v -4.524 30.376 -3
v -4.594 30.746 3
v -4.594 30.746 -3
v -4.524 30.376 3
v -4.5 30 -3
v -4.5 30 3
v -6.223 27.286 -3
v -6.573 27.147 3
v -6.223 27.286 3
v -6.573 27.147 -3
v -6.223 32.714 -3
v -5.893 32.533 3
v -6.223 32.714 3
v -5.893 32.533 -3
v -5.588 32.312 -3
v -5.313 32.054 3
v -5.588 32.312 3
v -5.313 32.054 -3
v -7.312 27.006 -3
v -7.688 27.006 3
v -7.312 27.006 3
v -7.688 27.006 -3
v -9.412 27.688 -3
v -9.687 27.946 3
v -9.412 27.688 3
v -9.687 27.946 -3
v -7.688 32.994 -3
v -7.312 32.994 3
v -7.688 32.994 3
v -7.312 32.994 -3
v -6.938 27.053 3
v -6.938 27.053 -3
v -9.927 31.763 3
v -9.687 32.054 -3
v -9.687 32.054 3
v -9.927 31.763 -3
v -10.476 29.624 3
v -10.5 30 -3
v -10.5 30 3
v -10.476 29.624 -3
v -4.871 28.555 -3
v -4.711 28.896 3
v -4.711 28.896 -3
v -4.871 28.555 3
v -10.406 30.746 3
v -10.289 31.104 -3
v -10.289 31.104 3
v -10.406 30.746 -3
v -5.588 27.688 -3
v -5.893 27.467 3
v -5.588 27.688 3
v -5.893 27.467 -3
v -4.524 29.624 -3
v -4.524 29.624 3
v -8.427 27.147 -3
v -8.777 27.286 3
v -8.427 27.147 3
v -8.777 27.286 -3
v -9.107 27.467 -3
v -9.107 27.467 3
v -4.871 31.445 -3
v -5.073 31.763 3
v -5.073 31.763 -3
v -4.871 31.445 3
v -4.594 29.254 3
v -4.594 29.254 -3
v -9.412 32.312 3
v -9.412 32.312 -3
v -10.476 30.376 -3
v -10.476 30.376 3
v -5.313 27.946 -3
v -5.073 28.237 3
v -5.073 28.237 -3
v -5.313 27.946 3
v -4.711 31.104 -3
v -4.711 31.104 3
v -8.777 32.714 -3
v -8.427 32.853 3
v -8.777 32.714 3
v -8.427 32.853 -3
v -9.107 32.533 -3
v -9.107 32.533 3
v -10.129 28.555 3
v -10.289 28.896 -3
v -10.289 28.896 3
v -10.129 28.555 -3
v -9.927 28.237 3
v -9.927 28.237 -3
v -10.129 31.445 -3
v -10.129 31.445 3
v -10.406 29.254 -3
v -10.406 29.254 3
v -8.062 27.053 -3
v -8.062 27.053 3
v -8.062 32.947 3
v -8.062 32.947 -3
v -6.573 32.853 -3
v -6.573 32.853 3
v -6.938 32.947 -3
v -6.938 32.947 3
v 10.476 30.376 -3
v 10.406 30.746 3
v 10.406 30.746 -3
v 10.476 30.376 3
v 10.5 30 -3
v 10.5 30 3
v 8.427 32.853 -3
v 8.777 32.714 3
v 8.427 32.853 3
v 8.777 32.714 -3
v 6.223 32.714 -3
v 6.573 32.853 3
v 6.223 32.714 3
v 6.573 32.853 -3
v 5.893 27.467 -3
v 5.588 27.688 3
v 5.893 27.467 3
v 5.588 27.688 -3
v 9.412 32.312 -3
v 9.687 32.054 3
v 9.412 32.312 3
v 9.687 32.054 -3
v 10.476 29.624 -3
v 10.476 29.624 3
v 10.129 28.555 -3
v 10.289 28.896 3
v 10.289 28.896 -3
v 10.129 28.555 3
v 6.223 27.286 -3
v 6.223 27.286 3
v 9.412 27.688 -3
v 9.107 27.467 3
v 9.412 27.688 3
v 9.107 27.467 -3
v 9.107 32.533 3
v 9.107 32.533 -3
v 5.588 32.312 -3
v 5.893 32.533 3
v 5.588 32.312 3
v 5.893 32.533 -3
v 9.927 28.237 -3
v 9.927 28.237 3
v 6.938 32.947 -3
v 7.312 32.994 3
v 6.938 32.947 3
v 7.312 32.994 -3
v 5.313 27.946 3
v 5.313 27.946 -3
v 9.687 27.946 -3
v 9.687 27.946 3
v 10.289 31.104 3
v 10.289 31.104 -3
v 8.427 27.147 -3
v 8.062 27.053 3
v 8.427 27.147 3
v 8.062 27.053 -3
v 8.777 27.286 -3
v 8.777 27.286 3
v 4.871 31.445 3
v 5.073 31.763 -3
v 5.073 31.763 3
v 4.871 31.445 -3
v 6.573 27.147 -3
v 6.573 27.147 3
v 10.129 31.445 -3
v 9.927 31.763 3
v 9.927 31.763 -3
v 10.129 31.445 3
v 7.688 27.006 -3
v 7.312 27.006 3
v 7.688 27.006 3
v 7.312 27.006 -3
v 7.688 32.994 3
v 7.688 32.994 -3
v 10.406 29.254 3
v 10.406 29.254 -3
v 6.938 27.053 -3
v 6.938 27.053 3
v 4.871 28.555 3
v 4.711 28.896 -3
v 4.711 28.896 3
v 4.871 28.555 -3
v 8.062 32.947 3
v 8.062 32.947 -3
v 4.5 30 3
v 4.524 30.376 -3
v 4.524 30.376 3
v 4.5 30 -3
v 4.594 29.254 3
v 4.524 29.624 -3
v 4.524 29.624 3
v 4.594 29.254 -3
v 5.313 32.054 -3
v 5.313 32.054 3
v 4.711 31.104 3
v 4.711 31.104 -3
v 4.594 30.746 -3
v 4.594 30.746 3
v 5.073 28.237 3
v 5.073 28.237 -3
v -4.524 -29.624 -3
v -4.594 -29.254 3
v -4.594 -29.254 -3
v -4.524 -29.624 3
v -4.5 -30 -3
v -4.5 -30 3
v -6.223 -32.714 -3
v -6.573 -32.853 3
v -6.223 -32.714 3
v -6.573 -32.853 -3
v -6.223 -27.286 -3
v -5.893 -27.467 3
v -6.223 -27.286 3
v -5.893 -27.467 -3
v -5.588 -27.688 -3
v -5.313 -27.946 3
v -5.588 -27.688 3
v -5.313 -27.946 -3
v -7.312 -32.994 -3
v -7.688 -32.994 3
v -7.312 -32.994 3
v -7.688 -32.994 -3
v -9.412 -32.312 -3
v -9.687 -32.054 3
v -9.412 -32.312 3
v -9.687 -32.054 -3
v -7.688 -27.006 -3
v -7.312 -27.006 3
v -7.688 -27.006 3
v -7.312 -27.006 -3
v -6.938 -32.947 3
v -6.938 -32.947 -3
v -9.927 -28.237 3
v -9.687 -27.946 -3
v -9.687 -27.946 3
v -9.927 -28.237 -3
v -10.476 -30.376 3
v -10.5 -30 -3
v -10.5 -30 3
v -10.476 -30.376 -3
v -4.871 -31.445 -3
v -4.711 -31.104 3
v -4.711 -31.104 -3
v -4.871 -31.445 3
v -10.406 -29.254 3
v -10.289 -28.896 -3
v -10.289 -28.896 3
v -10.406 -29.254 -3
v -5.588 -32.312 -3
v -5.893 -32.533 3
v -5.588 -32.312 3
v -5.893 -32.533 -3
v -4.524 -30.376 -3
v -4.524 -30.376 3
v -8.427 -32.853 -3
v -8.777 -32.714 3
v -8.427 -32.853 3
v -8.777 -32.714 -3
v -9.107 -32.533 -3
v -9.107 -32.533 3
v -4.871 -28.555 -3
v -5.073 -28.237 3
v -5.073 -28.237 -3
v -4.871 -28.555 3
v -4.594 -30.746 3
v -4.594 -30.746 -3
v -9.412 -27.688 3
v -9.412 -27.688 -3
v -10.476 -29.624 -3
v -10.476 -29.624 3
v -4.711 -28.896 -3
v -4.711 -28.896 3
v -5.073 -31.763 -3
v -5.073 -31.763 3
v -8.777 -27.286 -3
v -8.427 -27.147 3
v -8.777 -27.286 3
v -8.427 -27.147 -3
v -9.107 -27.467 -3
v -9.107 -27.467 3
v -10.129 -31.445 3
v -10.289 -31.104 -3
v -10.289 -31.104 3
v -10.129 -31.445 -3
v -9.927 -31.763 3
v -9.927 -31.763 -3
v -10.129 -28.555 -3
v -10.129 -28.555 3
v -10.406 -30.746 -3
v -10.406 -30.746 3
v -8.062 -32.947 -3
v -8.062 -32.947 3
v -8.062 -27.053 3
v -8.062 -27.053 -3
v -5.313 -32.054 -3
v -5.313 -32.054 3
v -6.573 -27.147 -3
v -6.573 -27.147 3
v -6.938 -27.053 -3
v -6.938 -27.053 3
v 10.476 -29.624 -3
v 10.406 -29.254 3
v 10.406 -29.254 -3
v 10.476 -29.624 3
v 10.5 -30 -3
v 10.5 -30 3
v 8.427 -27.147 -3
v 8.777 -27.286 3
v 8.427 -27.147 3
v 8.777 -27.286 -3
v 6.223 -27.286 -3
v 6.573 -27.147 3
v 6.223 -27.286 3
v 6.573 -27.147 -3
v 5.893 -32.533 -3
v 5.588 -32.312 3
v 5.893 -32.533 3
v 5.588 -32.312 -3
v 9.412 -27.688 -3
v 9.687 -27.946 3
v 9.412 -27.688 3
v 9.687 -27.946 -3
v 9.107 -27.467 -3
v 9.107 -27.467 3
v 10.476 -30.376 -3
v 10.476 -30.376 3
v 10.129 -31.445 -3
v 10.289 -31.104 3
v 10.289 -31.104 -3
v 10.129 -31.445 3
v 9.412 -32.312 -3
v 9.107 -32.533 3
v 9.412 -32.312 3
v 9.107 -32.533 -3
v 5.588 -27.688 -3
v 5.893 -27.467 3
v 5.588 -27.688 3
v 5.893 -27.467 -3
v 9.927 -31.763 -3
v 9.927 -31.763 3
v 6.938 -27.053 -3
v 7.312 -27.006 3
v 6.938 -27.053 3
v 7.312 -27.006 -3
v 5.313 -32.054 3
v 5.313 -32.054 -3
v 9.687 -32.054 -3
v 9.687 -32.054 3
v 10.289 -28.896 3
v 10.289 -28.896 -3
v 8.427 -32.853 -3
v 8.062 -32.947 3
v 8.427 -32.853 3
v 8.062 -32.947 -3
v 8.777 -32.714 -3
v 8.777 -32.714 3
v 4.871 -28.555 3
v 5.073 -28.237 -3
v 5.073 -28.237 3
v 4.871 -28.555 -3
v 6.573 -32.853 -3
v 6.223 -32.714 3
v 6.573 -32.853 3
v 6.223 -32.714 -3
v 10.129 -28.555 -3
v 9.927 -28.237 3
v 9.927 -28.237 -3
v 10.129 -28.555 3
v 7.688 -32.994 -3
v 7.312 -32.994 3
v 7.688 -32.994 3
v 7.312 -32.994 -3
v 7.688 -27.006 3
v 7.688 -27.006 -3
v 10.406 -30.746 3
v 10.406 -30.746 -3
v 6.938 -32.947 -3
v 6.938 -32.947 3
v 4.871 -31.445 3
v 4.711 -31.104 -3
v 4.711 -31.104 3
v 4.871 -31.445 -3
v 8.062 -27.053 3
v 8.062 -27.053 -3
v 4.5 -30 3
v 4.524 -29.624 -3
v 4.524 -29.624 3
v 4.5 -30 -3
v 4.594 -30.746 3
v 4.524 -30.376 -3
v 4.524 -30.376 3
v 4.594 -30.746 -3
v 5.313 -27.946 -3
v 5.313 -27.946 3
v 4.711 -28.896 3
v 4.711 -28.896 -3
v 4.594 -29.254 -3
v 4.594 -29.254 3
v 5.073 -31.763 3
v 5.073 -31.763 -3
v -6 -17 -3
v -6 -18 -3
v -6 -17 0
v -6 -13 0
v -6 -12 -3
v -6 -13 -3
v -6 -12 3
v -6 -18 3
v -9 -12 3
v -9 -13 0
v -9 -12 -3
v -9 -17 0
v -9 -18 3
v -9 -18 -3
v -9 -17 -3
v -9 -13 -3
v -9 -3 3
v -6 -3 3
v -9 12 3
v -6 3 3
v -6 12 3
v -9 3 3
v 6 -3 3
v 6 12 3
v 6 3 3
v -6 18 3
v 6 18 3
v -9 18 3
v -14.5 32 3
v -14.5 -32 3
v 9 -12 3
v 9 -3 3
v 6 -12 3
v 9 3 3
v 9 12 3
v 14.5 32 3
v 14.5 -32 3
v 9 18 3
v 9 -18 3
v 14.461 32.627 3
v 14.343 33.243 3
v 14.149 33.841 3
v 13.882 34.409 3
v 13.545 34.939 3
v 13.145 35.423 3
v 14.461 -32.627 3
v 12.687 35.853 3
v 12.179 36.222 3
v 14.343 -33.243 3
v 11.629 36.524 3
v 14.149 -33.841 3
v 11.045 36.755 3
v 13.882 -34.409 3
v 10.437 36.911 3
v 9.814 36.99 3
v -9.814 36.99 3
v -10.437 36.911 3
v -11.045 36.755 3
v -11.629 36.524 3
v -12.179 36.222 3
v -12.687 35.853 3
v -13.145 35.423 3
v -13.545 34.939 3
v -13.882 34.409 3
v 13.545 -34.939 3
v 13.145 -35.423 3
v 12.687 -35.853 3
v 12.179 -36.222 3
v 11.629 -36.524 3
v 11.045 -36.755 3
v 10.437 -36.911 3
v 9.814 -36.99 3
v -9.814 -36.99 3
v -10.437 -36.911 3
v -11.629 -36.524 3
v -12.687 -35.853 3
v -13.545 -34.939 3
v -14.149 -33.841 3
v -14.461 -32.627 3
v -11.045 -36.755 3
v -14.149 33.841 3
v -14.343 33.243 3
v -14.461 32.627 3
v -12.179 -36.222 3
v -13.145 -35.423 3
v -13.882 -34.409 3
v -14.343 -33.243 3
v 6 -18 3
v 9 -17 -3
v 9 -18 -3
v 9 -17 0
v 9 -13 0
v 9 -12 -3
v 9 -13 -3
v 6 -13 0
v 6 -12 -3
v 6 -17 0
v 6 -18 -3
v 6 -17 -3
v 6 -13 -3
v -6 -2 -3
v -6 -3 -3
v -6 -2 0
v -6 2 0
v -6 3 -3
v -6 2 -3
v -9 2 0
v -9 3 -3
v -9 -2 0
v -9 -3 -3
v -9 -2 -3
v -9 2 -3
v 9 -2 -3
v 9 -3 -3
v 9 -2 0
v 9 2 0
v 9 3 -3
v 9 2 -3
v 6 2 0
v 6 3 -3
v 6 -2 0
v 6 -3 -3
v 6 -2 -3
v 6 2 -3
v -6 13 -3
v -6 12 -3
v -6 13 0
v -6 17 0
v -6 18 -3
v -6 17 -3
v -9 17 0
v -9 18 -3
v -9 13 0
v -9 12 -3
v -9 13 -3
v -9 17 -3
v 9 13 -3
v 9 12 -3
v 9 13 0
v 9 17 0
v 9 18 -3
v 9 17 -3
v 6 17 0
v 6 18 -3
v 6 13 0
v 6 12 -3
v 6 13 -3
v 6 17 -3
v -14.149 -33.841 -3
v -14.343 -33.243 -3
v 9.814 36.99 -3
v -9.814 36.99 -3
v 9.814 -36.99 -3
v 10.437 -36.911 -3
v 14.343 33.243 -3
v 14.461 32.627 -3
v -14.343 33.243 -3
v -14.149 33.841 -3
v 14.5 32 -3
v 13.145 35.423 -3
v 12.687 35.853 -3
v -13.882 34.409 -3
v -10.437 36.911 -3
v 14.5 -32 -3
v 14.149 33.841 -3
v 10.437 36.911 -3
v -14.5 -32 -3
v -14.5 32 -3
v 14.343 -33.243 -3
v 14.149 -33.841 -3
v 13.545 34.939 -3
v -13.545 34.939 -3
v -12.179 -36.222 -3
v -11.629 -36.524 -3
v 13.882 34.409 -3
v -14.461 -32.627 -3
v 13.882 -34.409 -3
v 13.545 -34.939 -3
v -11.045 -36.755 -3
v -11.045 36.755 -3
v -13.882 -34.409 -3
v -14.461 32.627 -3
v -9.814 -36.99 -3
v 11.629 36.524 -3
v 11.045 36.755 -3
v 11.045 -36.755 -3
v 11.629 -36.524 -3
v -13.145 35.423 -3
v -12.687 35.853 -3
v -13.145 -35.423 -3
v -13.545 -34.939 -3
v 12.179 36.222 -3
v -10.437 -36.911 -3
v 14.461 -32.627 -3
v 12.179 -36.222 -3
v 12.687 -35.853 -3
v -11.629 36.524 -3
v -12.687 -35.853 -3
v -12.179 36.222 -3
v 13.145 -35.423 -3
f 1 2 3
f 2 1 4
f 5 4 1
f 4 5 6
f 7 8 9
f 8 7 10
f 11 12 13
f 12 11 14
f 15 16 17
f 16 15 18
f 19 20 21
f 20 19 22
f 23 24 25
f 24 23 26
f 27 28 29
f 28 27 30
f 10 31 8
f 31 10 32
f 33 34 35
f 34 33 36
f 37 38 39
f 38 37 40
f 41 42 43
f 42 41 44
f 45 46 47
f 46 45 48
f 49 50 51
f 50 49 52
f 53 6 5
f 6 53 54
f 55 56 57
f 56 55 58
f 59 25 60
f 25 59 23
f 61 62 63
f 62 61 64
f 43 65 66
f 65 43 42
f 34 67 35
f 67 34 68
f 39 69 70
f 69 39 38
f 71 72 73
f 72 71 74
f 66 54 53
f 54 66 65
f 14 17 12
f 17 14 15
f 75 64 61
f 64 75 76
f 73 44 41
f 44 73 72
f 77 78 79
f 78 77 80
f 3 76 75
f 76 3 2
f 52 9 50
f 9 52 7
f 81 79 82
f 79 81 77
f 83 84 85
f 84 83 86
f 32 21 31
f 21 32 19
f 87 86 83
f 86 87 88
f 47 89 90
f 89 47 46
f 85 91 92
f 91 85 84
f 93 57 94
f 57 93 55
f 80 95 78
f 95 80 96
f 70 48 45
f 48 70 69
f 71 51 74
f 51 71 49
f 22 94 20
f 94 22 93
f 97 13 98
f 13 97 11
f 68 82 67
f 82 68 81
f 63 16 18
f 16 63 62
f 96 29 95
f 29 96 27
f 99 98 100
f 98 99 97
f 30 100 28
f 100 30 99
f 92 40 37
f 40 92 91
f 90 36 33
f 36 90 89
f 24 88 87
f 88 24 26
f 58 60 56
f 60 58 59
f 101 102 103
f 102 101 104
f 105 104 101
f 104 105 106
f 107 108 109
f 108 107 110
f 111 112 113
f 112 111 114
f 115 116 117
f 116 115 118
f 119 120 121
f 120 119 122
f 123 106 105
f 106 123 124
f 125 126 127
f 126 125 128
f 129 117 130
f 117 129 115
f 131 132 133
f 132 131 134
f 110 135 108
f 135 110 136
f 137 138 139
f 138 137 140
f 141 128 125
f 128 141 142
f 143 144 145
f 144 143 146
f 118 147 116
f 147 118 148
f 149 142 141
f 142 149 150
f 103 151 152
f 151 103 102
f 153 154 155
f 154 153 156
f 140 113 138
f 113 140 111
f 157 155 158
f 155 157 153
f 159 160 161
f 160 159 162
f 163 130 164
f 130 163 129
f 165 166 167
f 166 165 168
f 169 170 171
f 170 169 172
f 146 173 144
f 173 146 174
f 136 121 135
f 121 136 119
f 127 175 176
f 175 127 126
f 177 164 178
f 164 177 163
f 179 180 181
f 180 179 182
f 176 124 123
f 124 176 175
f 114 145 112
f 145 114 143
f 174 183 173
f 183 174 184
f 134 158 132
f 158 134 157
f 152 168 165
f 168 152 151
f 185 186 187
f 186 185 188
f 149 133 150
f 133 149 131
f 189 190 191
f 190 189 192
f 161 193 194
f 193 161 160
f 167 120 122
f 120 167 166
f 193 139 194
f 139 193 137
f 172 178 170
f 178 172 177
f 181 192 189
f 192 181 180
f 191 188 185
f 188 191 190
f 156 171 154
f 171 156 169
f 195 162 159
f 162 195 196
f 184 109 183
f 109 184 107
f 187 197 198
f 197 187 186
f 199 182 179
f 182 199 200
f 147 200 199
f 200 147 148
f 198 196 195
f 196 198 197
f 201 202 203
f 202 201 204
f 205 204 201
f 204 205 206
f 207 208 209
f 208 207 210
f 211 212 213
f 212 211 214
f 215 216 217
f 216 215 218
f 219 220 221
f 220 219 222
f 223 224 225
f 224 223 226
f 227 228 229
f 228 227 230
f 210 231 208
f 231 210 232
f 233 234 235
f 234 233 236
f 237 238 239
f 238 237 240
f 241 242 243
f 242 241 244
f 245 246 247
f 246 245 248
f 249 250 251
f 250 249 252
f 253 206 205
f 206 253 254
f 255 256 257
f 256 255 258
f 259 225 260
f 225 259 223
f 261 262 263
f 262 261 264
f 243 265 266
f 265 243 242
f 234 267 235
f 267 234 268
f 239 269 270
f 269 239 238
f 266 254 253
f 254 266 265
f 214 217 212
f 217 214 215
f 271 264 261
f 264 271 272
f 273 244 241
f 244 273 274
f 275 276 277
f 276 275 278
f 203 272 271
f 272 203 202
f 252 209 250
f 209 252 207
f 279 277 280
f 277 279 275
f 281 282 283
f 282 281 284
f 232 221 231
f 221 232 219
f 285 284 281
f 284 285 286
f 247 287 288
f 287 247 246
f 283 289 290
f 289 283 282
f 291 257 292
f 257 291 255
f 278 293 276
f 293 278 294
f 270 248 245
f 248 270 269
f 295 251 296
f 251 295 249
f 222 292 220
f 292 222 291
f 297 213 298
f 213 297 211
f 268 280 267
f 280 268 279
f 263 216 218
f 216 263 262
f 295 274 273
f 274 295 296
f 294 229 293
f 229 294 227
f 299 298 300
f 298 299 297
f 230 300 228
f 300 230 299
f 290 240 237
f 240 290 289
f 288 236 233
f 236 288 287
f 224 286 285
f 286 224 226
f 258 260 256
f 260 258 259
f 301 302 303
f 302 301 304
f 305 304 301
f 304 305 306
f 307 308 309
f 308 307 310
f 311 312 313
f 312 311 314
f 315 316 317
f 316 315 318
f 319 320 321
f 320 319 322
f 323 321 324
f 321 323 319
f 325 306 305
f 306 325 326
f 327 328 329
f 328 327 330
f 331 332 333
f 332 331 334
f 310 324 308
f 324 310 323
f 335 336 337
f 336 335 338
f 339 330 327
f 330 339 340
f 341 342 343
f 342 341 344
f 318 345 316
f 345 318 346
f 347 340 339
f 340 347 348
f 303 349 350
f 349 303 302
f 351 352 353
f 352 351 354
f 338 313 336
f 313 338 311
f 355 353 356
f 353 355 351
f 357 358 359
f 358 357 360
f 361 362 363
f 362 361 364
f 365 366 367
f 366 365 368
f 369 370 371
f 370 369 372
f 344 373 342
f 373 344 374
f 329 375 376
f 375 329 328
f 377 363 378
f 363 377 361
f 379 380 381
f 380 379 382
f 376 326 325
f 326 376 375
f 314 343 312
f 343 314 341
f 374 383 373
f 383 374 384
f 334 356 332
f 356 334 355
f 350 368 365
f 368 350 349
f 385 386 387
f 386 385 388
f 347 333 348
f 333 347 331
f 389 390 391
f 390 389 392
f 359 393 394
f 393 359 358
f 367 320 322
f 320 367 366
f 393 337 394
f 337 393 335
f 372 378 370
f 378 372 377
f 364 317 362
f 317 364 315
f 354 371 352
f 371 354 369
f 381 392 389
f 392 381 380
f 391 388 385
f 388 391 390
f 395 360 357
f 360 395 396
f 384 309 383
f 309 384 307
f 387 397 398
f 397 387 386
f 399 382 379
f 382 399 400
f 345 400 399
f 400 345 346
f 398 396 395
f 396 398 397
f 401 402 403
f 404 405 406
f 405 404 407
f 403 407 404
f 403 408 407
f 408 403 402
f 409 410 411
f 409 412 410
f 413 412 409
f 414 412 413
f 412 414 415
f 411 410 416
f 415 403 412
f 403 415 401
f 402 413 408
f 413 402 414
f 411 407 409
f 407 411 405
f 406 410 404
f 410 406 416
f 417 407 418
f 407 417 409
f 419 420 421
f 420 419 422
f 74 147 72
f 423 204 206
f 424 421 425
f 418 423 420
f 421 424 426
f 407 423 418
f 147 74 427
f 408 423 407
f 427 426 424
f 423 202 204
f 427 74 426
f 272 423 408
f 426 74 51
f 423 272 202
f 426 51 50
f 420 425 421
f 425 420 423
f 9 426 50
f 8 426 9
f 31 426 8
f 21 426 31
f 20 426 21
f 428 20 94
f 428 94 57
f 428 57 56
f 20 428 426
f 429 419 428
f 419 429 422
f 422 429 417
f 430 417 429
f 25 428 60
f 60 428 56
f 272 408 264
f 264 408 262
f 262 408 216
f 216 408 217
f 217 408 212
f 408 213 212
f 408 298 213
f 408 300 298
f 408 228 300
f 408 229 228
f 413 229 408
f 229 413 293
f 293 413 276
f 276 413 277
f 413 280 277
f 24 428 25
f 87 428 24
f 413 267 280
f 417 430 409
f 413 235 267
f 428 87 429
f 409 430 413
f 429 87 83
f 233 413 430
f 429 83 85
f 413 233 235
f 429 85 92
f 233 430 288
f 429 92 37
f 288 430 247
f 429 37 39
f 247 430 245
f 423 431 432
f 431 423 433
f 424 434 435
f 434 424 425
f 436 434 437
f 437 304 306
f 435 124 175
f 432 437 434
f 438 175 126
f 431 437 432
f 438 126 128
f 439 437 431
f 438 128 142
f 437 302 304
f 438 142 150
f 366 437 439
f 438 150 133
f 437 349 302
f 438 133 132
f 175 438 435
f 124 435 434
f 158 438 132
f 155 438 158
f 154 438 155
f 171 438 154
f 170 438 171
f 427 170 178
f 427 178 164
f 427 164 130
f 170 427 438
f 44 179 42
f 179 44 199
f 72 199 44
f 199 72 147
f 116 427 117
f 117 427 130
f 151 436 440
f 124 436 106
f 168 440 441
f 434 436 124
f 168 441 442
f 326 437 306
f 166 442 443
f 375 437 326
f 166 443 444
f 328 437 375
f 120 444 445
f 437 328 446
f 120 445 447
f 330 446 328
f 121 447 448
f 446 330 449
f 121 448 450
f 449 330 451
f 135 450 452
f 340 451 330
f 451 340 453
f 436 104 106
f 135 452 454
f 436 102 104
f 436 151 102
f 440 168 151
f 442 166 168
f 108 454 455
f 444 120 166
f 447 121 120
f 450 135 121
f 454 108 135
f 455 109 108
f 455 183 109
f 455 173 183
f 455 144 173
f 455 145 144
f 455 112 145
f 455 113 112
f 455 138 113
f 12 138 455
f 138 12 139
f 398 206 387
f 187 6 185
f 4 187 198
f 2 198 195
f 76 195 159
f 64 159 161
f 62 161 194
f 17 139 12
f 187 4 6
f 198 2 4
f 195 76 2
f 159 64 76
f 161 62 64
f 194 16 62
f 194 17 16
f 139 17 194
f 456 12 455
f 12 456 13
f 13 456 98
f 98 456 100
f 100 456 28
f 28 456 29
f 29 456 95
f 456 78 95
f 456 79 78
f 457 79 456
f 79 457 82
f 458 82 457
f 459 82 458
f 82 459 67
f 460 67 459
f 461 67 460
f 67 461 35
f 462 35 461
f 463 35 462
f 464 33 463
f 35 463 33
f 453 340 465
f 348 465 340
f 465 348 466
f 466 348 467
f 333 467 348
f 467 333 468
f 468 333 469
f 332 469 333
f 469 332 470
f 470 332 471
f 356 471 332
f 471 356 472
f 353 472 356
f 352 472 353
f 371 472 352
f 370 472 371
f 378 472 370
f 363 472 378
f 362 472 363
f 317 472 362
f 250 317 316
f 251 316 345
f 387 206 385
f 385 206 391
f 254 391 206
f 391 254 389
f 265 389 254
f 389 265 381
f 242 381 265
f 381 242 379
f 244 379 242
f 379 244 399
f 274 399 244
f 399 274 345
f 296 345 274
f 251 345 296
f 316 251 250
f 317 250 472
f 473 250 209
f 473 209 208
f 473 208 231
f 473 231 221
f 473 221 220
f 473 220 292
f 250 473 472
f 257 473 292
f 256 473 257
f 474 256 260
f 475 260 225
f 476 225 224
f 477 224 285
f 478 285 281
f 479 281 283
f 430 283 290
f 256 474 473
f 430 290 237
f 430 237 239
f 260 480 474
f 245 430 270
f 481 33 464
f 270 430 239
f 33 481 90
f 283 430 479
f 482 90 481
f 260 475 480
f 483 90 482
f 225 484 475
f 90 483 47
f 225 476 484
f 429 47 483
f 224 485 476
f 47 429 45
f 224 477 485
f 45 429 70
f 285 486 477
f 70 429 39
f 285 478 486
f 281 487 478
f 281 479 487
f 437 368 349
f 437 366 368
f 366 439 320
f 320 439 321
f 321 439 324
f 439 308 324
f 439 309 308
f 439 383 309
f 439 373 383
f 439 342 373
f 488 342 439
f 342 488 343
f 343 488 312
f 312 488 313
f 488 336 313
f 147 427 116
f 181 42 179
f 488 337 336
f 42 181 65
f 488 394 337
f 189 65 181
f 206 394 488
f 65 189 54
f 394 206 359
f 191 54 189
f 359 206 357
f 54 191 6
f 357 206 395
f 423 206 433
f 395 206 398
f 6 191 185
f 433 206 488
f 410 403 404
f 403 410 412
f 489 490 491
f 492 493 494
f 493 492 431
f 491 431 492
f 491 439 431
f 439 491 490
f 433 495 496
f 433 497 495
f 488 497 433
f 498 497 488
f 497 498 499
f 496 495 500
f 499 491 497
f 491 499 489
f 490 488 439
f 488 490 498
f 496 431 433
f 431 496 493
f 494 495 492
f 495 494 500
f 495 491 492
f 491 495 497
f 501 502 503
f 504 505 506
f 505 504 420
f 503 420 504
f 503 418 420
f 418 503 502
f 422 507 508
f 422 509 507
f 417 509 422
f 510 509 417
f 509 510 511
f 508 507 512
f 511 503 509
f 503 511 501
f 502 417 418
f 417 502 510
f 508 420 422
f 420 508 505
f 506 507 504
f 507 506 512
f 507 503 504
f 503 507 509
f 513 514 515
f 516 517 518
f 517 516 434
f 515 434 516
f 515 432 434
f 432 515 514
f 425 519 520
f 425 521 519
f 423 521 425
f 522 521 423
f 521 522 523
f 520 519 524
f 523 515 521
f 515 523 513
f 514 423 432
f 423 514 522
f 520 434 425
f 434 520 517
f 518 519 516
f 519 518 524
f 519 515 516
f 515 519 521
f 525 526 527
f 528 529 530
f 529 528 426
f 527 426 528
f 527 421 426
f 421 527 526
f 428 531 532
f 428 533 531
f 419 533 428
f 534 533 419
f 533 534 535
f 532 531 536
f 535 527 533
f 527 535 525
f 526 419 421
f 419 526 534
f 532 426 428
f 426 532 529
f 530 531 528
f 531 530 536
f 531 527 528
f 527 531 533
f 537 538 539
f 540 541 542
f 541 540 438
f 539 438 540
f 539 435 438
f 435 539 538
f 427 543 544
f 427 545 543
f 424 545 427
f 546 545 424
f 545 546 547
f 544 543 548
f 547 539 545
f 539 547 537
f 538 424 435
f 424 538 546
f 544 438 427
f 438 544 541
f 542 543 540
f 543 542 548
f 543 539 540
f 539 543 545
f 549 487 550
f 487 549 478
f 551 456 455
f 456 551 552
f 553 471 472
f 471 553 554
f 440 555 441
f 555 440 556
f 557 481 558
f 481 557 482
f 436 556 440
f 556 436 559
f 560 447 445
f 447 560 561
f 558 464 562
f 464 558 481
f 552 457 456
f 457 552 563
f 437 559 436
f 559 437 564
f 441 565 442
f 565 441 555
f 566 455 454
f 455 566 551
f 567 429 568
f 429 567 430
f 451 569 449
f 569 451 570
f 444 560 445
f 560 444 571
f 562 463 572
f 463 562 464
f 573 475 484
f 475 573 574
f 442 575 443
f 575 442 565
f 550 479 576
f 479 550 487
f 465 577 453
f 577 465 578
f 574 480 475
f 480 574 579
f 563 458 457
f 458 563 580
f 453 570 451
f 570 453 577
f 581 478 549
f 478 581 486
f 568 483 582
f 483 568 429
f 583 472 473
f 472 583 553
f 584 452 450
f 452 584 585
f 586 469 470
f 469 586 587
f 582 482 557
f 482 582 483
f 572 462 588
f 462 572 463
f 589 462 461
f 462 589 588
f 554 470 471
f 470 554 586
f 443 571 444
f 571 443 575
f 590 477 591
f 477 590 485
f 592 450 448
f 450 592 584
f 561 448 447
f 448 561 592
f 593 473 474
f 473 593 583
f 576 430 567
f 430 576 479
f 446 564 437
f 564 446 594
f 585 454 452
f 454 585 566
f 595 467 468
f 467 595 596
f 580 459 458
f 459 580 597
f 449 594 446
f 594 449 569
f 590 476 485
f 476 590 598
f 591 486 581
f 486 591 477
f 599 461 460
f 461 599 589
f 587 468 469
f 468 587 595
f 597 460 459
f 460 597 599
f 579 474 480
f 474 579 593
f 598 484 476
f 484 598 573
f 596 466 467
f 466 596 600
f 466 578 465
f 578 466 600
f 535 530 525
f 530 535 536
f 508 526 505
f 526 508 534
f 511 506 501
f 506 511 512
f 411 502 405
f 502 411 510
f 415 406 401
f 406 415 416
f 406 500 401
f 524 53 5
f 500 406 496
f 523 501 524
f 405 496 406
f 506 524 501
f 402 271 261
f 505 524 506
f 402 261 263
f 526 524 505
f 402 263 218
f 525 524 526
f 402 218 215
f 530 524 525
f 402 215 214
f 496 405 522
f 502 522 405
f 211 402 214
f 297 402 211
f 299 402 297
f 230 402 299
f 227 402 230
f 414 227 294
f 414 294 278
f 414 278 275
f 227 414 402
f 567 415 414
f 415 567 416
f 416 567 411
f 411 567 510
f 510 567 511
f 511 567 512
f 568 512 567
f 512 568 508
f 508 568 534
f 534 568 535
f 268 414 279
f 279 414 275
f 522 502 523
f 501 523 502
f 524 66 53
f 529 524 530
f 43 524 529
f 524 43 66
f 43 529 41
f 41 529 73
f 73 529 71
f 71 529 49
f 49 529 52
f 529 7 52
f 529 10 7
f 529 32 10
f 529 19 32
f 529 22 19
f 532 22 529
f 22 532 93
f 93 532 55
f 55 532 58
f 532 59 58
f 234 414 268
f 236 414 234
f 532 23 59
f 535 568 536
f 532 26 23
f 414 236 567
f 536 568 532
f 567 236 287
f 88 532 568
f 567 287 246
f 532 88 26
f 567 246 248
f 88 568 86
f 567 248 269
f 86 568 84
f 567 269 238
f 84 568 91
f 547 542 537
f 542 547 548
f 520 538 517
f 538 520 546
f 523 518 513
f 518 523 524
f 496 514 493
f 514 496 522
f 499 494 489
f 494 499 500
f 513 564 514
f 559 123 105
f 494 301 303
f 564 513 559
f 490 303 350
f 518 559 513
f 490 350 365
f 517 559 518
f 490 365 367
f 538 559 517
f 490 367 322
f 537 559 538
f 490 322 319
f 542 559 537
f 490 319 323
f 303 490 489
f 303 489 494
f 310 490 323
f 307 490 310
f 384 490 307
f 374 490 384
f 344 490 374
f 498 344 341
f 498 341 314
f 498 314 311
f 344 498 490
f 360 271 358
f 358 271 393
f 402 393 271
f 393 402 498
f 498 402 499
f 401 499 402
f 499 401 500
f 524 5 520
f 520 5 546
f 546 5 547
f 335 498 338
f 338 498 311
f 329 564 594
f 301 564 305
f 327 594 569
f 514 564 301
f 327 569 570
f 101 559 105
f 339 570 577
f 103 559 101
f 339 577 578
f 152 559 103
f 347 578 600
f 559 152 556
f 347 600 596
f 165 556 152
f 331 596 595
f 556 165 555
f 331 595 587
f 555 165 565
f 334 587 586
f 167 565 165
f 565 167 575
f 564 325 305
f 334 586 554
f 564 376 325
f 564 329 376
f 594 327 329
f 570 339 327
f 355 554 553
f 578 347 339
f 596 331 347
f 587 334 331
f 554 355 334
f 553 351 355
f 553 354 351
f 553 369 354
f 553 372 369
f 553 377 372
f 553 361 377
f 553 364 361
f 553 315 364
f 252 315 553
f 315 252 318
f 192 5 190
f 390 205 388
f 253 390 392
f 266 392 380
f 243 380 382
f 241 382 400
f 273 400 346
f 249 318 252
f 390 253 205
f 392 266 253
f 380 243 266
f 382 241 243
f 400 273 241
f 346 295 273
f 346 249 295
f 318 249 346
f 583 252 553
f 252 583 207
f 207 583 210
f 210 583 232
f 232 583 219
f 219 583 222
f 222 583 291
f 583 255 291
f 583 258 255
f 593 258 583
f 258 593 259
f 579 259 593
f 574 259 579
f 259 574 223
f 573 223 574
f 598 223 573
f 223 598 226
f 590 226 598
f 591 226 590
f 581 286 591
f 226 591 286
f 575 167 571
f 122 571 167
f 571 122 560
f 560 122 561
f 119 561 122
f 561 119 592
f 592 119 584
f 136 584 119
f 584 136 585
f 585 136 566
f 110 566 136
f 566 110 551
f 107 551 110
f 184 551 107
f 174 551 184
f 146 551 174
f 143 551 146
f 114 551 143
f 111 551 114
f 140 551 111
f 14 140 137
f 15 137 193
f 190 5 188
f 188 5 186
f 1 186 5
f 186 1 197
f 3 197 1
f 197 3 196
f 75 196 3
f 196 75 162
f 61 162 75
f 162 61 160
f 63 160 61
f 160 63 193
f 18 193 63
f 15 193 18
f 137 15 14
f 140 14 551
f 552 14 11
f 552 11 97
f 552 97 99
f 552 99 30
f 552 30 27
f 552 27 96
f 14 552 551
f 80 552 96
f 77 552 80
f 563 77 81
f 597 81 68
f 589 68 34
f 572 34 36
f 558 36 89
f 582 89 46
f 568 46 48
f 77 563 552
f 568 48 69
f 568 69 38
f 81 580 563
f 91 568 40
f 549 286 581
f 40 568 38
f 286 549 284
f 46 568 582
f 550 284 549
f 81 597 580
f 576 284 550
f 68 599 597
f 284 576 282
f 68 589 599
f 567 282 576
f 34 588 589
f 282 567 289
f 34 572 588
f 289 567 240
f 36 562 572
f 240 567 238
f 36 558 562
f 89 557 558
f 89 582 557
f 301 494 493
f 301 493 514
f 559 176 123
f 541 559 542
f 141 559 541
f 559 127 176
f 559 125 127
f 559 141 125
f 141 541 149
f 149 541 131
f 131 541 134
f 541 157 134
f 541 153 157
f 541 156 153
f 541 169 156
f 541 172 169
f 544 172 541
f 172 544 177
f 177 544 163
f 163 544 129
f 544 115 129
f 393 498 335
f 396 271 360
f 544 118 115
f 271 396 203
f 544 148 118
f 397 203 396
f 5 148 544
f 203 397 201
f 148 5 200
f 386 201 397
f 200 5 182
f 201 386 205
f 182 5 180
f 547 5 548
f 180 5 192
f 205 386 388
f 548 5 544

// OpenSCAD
$fn = 50;


difference() {
	union() {
		translate(v = [0, 0, -3.0000000000]) {
			rotate(a = [0, 0, 0]) {
				hull() {
					translate(v = [-9.5000000000, 32.0000000000, 0]) {
						rotate(a = [0, 0, 0]) {
							translate(v = [0, 0, 0]) {
								rotate(a = [0, 0, 0]) {
									cylinder(h = 6, r = 5);
								}
							}
						}
					}
					translate(v = [9.5000000000, 32.0000000000, 0]) {
						rotate(a = [0, 0, 0]) {
							translate(v = [0, 0, 0]) {
								rotate(a = [0, 0, 0]) {
									cylinder(h = 6, r = 5);
								}
							}
						}
					}
					translate(v = [-9.5000000000, -32.0000000000, 0]) {
						rotate(a = [0, 0, 0]) {
							translate(v = [0, 0, 0]) {
								rotate(a = [0, 0, 0]) {
									cylinder(h = 6, r = 5);
								}
							}
						}
					}
					translate(v = [9.5000000000, -32.0000000000, 0]) {
						rotate(a = [0, 0, 0]) {
							translate(v = [0, 0, 0]) {
								rotate(a = [0, 0, 0]) {
									cylinder(h = 6, r = 5);
								}
							}
						}
					}
				}
			}
		}
	}
	union() {
		translate(v = [-7.5000000000, 30.0000000000, -125.0000000000]) {
			rotate(a = [0, 0, 0]) {
				cylinder(h = 250, r = 3.0000000000);
			}
		}
		translate(v = [7.5000000000, 30.0000000000, -125.0000000000]) {
			rotate(a = [0, 0, 0]) {
				cylinder(h = 250, r = 3.0000000000);
			}
		}
		translate(v = [-7.5000000000, -30.0000000000, -125.0000000000]) {
			rotate(a = [0, 0, 0]) {
				cylinder(h = 250, r = 3.0000000000);
			}
		}
		translate(v = [7.5000000000, -30.0000000000, -125.0000000000]) {
			rotate(a = [0, 0, 0]) {
				cylinder(h = 250, r = 3.0000000000);
			}
		}
		translate(v = [-9.0000000000, -18.0000000000, -50]) {
			rotate(a = [0, 0, 0]) {
				cube(size = [3, 1, 100]);
			}
		}
		translate(v = [-9.0000000000, -13.0000000000, -50]) {
			rotate(a = [0, 0, 0]) {
				cube(size = [3, 1, 100]);
			}
		}
		translate(v = [-9.0000000000, -18.0000000000, 0]) {
			rotate(a = [0, 0, 0]) {
				cube(size = [3, 6, 3]);
			}
		}
		translate(v = [6.0000000000, -18.0000000000, -50]) {
			rotate(a = [0, 0, 0]) {
				cube(size = [3, 1, 100]);
			}
		}
		translate(v = [6.0000000000, -13.0000000000, -50]) {
			rotate(a = [0, 0, 0]) {
				cube(size = [3, 1, 100]);
			}
		}
		translate(v = [6.0000000000, -18.0000000000, 0]) {
			rotate(a = [0, 0, 0]) {
				cube(size = [3, 6, 3]);
			}
		}
		translate(v = [-9.0000000000, -3.0000000000, -50]) {
			rotate(a = [0, 0, 0]) {
				cube(size = [3, 1, 100]);
			}
		}
		translate(v = [-9.0000000000, 2.0000000000, -50]) {
			rotate(a = [0, 0, 0]) {
				cube(size = [3, 1, 100]);
			}
		}
		translate(v = [-9.0000000000, -3.0000000000, 0]) {
			rotate(a = [0, 0, 0]) {
				cube(size = [3, 6, 3]);
			}
		}
		translate(v = [6.0000000000, -3.0000000000, -50]) {
			rotate(a = [0, 0, 0]) {
				cube(size = [3, 1, 100]);
			}
		}
		translate(v = [6.0000000000, 2.0000000000, -50]) {
			rotate(a = [0, 0, 0]) {
				cube(size = [3, 1, 100]);
			}
		}
		translate(v = [6.0000000000, -3.0000000000, 0]) {
			rotate(a = [0, 0, 0]) {
				cube(size = [3, 6, 3]);
			}
		}
		translate(v = [-9.0000000000, 12.0000000000, -50]) {
			rotate(a = [0, 0, 0]) {
				cube(size = [3, 1, 100]);
			}
		}
		translate(v = [-9.0000000000, 17.0000000000, -50]) {
			rotate(a = [0, 0, 0]) {
				cube(size = [3, 1, 100]);
			}
		}
		translate(v = [-9.0000000000, 12.0000000000, 0]) {
			rotate(a = [0, 0, 0]) {
				cube(size = [3, 6, 3]);
			}
		}
		translate(v = [6.0000000000, 12.0000000000, -50]) {
			rotate(a = [0, 0, 0]) {
				cube(size = [3, 1, 100]);
			}
		}
		translate(v = [6.0000000000, 17.0000000000, -50]) {
			rotate(a = [0, 0, 0]) {
				cube(size = [3, 1, 100]);
			}
		}
		translate(v = [6.0000000000, 12.0000000000, 0]) {
			rotate(a = [0, 0, 0]) {
				cube(size = [3, 6, 3]);
			}
		}
	}
}
